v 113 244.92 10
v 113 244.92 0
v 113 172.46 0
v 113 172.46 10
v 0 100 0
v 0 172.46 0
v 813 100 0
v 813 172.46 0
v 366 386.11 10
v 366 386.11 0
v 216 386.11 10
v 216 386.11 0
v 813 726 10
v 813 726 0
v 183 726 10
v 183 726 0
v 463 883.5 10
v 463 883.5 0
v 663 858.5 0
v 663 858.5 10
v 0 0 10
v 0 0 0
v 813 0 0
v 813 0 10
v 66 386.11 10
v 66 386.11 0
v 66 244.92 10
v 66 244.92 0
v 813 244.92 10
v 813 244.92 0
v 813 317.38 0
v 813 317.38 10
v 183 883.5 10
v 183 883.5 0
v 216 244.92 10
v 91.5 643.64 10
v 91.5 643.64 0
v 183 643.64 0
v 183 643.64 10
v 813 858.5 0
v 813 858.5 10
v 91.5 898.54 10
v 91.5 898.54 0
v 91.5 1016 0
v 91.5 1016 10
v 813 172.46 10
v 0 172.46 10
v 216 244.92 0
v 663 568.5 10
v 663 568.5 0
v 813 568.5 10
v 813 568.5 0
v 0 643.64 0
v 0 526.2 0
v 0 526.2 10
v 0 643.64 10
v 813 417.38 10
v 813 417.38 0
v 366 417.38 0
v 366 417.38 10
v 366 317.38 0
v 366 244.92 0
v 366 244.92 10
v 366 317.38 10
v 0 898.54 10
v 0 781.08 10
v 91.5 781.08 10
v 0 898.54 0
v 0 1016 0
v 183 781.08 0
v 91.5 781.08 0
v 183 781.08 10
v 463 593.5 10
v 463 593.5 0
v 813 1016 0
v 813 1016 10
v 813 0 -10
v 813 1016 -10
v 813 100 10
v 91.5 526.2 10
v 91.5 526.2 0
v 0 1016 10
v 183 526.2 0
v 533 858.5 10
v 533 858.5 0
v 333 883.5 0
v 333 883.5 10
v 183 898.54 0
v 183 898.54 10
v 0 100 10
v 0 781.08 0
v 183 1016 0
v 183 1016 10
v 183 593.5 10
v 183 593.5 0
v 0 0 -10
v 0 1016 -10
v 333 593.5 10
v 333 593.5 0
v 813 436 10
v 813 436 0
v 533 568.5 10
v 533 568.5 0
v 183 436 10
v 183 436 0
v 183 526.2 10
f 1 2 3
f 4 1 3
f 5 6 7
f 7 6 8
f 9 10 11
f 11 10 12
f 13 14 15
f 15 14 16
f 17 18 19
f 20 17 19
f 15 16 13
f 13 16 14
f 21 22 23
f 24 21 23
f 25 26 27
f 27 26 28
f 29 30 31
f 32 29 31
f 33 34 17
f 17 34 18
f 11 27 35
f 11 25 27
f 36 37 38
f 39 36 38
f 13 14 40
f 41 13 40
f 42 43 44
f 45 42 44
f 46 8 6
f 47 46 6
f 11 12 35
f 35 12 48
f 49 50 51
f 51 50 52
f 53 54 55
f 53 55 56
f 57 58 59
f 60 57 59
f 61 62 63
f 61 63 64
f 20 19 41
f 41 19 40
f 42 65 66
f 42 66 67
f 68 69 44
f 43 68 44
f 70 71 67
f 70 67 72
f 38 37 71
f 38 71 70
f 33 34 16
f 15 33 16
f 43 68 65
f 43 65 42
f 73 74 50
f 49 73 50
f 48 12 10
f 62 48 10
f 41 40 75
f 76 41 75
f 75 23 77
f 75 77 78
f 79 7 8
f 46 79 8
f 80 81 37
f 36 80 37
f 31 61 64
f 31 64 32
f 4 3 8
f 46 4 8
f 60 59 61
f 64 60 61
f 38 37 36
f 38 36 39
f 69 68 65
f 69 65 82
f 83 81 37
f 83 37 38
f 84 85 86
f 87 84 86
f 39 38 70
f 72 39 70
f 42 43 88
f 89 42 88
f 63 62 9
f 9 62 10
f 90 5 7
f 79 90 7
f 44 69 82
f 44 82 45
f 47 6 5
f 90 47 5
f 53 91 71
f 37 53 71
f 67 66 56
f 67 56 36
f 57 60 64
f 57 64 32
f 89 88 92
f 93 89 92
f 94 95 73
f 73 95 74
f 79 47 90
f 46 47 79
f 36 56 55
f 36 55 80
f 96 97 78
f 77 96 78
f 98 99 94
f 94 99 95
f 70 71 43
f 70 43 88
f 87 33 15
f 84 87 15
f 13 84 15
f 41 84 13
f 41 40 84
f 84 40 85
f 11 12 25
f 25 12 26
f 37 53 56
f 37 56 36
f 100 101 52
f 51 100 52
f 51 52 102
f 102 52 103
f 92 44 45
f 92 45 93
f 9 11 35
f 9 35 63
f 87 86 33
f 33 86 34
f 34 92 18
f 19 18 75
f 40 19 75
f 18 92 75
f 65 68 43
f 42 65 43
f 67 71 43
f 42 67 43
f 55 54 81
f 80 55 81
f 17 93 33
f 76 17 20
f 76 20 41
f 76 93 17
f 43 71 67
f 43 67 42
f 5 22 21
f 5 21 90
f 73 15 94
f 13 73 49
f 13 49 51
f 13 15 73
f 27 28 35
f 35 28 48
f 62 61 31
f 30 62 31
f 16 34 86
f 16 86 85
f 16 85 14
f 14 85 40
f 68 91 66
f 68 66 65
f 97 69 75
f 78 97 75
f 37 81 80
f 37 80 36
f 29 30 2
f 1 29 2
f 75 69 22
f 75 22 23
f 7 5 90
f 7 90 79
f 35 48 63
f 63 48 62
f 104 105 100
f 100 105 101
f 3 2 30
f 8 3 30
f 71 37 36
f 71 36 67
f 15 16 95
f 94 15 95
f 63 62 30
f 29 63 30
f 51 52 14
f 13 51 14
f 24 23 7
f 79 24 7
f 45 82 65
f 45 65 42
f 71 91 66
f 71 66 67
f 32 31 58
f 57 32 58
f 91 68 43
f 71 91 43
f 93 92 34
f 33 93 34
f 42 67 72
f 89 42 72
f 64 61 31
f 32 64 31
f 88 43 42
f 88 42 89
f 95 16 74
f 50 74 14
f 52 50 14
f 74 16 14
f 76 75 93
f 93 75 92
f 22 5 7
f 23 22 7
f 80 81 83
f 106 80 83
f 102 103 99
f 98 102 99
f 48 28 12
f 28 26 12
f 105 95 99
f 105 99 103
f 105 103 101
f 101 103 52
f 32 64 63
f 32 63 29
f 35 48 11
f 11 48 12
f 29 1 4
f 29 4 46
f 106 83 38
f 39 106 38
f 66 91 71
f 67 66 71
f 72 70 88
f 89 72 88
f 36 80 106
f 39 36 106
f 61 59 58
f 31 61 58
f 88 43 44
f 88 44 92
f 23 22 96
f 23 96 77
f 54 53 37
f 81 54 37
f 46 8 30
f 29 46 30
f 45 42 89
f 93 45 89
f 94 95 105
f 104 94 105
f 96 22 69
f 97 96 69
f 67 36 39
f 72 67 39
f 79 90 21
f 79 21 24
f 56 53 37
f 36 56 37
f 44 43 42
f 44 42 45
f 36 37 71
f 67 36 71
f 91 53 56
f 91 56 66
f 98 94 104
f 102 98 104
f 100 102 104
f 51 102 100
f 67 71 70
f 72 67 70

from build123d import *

# Parameters (mm, degrees)
BOSS_EXTRUDE2_DEPTH   = 10
SKETCH1_W             = 91.5
SKETCH1_H             = 117.46
BOSS_EXTRUDE2_2_DEPTH = 10
BOSS_EXTRUDE2_3_DEPTH = 10
SKETCH1_H_2           = 117.44
BOSS_EXTRUDE2_4_DEPTH = 10
SKETCH1_W_2           = 447
SKETCH1_H_3           = 100
BOSS_EXTRUDE2_5_DEPTH = 10
SKETCH1_W_3           = 813
SKETCH1_H_4           = 72.46
BOSS_EXTRUDE2_6_DEPTH = 10
SKETCH1_W_4           = 150
SKETCH1_H_5           = 141.19
BOSS_EXTRUDE2_7_DEPTH = 10
SKETCH1_4_W           = 91.5
SKETCH1_4_H           = 117.46
BOSS_EXTRUDE3_DEPTH   = 10
BOSS_EXTRUDE3_2_DEPTH = 10
SKETCH1_4_H_2         = 137.44
BOSS_EXTRUDE3_3_DEPTH = 10
BOSS_EXTRUDE3_4_DEPTH = 10
SKETCH1_4_W_2         = 813
SKETCH1_4_H_3         = 100
BOSS_EXTRUDE3_5_DEPTH = 10
SKETCH1_4_W_3         = 150
SKETCH1_4_H_4         = 141.19
BOSS_EXTRUDE3_6_DEPTH = 10
SKETCH1_5_W           = 91.5
SKETCH1_5_H           = 117.46
BOSS_EXTRUDE4_DEPTH   = 10
SKETCH1_5_H_2         = 117.44
BOSS_EXTRUDE4_2_DEPTH = 10
SKETCH1_5_W_2         = 447
SKETCH1_5_H_3         = 72.46
BOSS_EXTRUDE4_3_DEPTH = 10
SKETCH1_6_W           = 91.5
SKETCH1_6_H           = 117.46
BOSS_EXTRUDE5_DEPTH   = 10
SKETCH1_6_H_2         = 137.44
BOSS_EXTRUDE5_2_DEPTH = 10
SKETCH1_6_W_2         = 700
SKETCH1_6_H_3         = 72.46
BOSS_EXTRUDE5_3_DEPTH = 10
SKETCH1_8_W           = 813
SKETCH1_8_H           = 1016
BOSS_EXTRUDE6_DEPTH   = 10


with BuildPart() as part:
    # Sketch1 → Boss-Extrude2 (new body)
    with BuildSketch(Plane.XY):
        Polygon((813, 1016), (183, 1016), (183, 883.5), (463, 883.5), (663, 858.5), (813, 858.5), align=None)
    extrude(amount=BOSS_EXTRUDE2_DEPTH)


with BuildPart() as body_2:
    # Sketch1 → Boss-Extrude2 2 (new body)
    with BuildSketch(Plane.XY):
        with Locations((45.75, 839.81)):
            Rectangle(SKETCH1_W, SKETCH1_H)
    extrude(amount=BOSS_EXTRUDE2_2_DEPTH)


with BuildPart() as body_3:
    # Sketch1 → Boss-Extrude2 3 (new body)
    with BuildSketch(Plane.XY):
        Polygon((813, 568.5), (813, 726), (183, 726), (183, 593.5), (463, 593.5), (663, 568.5), align=None)
    extrude(amount=BOSS_EXTRUDE2_3_DEPTH)


with BuildPart() as body_4:
    # Sketch1 → Boss-Extrude2 4 (new body)
    with BuildSketch(Plane.XY):
        with Locations((45.75, 584.92)):
            Rectangle(SKETCH1_W, SKETCH1_H_2)
    extrude(amount=BOSS_EXTRUDE2_4_DEPTH)


with BuildPart() as body_5:
    # Sketch1 → Boss-Extrude2 5 (new body)
    with BuildSketch(Plane.XY):
        with Locations((589.5, 367.38)):
            Rectangle(SKETCH1_W_2, SKETCH1_H_3)
    extrude(amount=BOSS_EXTRUDE2_5_DEPTH)


with BuildPart() as body_6:
    # Sketch1 → Boss-Extrude2 6 (new body)
    with BuildSketch(Plane.XY):
        with Locations((406.5, 136.23)):
            Rectangle(SKETCH1_W_3, SKETCH1_H_4)
    extrude(amount=BOSS_EXTRUDE2_6_DEPTH)


with BuildPart() as body_7:
    # Sketch1 → Boss-Extrude2 7 (new body)
    with BuildSketch(Plane.XY):
        with Locations((141, 315.515)):
            Rectangle(SKETCH1_W_4, SKETCH1_H_5)
    extrude(amount=BOSS_EXTRUDE2_7_DEPTH)


with BuildPart() as body_8:
    # Sketch1<4> → Boss-Extrude3 (new body)
    with BuildSketch(Plane.XY):
        with Locations((45.75, 957.27)):
            Rectangle(SKETCH1_4_W, SKETCH1_4_H)
    extrude(amount=BOSS_EXTRUDE3_DEPTH)


with BuildPart() as body_9:
    # Sketch1<4> → Boss-Extrude3 2 (new body)
    with BuildSketch(Plane.XY):
        Polygon((333, 883.5), (183, 883.5), (183, 726), (813, 726), (813, 858.5), (533, 858.5), align=None)
    extrude(amount=BOSS_EXTRUDE3_2_DEPTH)


with BuildPart() as body_10:
    # Sketch1<4> → Boss-Extrude3 3 (new body)
    with BuildSketch(Plane.XY):
        with Locations((45.75, 712.36)):
            Rectangle(SKETCH1_4_W, SKETCH1_4_H_2)
    extrude(amount=BOSS_EXTRUDE3_3_DEPTH)


with BuildPart() as body_11:
    # Sketch1<4> → Boss-Extrude3 4 (new body)
    with BuildSketch(Plane.XY):
        Polygon((813, 436), (813, 568.5), (533, 568.5), (333, 593.5), (183, 593.5), (183, 436), align=None)
    extrude(amount=BOSS_EXTRUDE3_4_DEPTH)


with BuildPart() as body_12:
    # Sketch1<4> → Boss-Extrude3 5 (new body)
    with BuildSketch(Plane.XY):
        with Locations((406.5, 50)):
            Rectangle(SKETCH1_4_W_2, SKETCH1_4_H_3)
    extrude(amount=BOSS_EXTRUDE3_5_DEPTH)


with BuildPart() as body_13:
    # Sketch1<4> → Boss-Extrude3 6 (new body)
    with BuildSketch(Plane.XY):
        with Locations((291, 315.515)):
            Rectangle(SKETCH1_4_W_3, SKETCH1_4_H_4)
    extrude(amount=BOSS_EXTRUDE3_6_DEPTH)


with BuildPart() as body_14:
    # Sketch1<5> → Boss-Extrude4 (new body)
    with BuildSketch(Plane.XY):
        with Locations((137.25, 839.81)):
            Rectangle(SKETCH1_5_W, SKETCH1_5_H)
    extrude(amount=BOSS_EXTRUDE4_DEPTH)


with BuildPart() as body_15:
    # Sketch1<5> → Boss-Extrude4 2 (new body)
    with BuildSketch(Plane.XY):
        with Locations((137.25, 584.92)):
            Rectangle(SKETCH1_5_W, SKETCH1_5_H_2)
    extrude(amount=BOSS_EXTRUDE4_2_DEPTH)


with BuildPart() as body_16:
    # Sketch1<5> → Boss-Extrude4 3 (new body)
    with BuildSketch(Plane.XY):
        with Locations((589.5, 281.15)):
            Rectangle(SKETCH1_5_W_2, SKETCH1_5_H_3)
    extrude(amount=BOSS_EXTRUDE4_3_DEPTH)


with BuildPart() as body_17:
    # Sketch1<6> → Boss-Extrude5 (new body)
    with BuildSketch(Plane.XY):
        with Locations((137.25, 957.27)):
            Rectangle(SKETCH1_6_W, SKETCH1_6_H)
    extrude(amount=BOSS_EXTRUDE5_DEPTH)


with BuildPart() as body_18:
    # Sketch1<6> → Boss-Extrude5 2 (new body)
    with BuildSketch(Plane.XY):
        with Locations((137.25, 712.36)):
            Rectangle(SKETCH1_6_W, SKETCH1_6_H_2)
    extrude(amount=BOSS_EXTRUDE5_2_DEPTH)


with BuildPart() as body_19:
    # Sketch1<6> → Boss-Extrude5 3 (new body)
    with BuildSketch(Plane.XY):
        with Locations((463, 208.69)):
            Rectangle(SKETCH1_6_W_2, SKETCH1_6_H_3)
    extrude(amount=BOSS_EXTRUDE5_3_DEPTH)


with BuildPart() as body_20:
    # Sketch1<8> → Boss-Extrude6 (new body)
    with BuildSketch(Plane.XY):
        with Locations((406.5, 508)):
            Rectangle(SKETCH1_8_W, SKETCH1_8_H)
    extrude(amount=-BOSS_EXTRUDE6_DEPTH)


solid = Compound([part.part, body_2.part, body_3.part, body_4.part, body_5.part, body_6.part, body_7.part, body_8.part, body_9.part, body_10.part, body_11.part, body_12.part, body_13.part, body_14.part, body_15.part, body_16.part, body_17.part, body_18.part, body_19.part, body_20.part])
